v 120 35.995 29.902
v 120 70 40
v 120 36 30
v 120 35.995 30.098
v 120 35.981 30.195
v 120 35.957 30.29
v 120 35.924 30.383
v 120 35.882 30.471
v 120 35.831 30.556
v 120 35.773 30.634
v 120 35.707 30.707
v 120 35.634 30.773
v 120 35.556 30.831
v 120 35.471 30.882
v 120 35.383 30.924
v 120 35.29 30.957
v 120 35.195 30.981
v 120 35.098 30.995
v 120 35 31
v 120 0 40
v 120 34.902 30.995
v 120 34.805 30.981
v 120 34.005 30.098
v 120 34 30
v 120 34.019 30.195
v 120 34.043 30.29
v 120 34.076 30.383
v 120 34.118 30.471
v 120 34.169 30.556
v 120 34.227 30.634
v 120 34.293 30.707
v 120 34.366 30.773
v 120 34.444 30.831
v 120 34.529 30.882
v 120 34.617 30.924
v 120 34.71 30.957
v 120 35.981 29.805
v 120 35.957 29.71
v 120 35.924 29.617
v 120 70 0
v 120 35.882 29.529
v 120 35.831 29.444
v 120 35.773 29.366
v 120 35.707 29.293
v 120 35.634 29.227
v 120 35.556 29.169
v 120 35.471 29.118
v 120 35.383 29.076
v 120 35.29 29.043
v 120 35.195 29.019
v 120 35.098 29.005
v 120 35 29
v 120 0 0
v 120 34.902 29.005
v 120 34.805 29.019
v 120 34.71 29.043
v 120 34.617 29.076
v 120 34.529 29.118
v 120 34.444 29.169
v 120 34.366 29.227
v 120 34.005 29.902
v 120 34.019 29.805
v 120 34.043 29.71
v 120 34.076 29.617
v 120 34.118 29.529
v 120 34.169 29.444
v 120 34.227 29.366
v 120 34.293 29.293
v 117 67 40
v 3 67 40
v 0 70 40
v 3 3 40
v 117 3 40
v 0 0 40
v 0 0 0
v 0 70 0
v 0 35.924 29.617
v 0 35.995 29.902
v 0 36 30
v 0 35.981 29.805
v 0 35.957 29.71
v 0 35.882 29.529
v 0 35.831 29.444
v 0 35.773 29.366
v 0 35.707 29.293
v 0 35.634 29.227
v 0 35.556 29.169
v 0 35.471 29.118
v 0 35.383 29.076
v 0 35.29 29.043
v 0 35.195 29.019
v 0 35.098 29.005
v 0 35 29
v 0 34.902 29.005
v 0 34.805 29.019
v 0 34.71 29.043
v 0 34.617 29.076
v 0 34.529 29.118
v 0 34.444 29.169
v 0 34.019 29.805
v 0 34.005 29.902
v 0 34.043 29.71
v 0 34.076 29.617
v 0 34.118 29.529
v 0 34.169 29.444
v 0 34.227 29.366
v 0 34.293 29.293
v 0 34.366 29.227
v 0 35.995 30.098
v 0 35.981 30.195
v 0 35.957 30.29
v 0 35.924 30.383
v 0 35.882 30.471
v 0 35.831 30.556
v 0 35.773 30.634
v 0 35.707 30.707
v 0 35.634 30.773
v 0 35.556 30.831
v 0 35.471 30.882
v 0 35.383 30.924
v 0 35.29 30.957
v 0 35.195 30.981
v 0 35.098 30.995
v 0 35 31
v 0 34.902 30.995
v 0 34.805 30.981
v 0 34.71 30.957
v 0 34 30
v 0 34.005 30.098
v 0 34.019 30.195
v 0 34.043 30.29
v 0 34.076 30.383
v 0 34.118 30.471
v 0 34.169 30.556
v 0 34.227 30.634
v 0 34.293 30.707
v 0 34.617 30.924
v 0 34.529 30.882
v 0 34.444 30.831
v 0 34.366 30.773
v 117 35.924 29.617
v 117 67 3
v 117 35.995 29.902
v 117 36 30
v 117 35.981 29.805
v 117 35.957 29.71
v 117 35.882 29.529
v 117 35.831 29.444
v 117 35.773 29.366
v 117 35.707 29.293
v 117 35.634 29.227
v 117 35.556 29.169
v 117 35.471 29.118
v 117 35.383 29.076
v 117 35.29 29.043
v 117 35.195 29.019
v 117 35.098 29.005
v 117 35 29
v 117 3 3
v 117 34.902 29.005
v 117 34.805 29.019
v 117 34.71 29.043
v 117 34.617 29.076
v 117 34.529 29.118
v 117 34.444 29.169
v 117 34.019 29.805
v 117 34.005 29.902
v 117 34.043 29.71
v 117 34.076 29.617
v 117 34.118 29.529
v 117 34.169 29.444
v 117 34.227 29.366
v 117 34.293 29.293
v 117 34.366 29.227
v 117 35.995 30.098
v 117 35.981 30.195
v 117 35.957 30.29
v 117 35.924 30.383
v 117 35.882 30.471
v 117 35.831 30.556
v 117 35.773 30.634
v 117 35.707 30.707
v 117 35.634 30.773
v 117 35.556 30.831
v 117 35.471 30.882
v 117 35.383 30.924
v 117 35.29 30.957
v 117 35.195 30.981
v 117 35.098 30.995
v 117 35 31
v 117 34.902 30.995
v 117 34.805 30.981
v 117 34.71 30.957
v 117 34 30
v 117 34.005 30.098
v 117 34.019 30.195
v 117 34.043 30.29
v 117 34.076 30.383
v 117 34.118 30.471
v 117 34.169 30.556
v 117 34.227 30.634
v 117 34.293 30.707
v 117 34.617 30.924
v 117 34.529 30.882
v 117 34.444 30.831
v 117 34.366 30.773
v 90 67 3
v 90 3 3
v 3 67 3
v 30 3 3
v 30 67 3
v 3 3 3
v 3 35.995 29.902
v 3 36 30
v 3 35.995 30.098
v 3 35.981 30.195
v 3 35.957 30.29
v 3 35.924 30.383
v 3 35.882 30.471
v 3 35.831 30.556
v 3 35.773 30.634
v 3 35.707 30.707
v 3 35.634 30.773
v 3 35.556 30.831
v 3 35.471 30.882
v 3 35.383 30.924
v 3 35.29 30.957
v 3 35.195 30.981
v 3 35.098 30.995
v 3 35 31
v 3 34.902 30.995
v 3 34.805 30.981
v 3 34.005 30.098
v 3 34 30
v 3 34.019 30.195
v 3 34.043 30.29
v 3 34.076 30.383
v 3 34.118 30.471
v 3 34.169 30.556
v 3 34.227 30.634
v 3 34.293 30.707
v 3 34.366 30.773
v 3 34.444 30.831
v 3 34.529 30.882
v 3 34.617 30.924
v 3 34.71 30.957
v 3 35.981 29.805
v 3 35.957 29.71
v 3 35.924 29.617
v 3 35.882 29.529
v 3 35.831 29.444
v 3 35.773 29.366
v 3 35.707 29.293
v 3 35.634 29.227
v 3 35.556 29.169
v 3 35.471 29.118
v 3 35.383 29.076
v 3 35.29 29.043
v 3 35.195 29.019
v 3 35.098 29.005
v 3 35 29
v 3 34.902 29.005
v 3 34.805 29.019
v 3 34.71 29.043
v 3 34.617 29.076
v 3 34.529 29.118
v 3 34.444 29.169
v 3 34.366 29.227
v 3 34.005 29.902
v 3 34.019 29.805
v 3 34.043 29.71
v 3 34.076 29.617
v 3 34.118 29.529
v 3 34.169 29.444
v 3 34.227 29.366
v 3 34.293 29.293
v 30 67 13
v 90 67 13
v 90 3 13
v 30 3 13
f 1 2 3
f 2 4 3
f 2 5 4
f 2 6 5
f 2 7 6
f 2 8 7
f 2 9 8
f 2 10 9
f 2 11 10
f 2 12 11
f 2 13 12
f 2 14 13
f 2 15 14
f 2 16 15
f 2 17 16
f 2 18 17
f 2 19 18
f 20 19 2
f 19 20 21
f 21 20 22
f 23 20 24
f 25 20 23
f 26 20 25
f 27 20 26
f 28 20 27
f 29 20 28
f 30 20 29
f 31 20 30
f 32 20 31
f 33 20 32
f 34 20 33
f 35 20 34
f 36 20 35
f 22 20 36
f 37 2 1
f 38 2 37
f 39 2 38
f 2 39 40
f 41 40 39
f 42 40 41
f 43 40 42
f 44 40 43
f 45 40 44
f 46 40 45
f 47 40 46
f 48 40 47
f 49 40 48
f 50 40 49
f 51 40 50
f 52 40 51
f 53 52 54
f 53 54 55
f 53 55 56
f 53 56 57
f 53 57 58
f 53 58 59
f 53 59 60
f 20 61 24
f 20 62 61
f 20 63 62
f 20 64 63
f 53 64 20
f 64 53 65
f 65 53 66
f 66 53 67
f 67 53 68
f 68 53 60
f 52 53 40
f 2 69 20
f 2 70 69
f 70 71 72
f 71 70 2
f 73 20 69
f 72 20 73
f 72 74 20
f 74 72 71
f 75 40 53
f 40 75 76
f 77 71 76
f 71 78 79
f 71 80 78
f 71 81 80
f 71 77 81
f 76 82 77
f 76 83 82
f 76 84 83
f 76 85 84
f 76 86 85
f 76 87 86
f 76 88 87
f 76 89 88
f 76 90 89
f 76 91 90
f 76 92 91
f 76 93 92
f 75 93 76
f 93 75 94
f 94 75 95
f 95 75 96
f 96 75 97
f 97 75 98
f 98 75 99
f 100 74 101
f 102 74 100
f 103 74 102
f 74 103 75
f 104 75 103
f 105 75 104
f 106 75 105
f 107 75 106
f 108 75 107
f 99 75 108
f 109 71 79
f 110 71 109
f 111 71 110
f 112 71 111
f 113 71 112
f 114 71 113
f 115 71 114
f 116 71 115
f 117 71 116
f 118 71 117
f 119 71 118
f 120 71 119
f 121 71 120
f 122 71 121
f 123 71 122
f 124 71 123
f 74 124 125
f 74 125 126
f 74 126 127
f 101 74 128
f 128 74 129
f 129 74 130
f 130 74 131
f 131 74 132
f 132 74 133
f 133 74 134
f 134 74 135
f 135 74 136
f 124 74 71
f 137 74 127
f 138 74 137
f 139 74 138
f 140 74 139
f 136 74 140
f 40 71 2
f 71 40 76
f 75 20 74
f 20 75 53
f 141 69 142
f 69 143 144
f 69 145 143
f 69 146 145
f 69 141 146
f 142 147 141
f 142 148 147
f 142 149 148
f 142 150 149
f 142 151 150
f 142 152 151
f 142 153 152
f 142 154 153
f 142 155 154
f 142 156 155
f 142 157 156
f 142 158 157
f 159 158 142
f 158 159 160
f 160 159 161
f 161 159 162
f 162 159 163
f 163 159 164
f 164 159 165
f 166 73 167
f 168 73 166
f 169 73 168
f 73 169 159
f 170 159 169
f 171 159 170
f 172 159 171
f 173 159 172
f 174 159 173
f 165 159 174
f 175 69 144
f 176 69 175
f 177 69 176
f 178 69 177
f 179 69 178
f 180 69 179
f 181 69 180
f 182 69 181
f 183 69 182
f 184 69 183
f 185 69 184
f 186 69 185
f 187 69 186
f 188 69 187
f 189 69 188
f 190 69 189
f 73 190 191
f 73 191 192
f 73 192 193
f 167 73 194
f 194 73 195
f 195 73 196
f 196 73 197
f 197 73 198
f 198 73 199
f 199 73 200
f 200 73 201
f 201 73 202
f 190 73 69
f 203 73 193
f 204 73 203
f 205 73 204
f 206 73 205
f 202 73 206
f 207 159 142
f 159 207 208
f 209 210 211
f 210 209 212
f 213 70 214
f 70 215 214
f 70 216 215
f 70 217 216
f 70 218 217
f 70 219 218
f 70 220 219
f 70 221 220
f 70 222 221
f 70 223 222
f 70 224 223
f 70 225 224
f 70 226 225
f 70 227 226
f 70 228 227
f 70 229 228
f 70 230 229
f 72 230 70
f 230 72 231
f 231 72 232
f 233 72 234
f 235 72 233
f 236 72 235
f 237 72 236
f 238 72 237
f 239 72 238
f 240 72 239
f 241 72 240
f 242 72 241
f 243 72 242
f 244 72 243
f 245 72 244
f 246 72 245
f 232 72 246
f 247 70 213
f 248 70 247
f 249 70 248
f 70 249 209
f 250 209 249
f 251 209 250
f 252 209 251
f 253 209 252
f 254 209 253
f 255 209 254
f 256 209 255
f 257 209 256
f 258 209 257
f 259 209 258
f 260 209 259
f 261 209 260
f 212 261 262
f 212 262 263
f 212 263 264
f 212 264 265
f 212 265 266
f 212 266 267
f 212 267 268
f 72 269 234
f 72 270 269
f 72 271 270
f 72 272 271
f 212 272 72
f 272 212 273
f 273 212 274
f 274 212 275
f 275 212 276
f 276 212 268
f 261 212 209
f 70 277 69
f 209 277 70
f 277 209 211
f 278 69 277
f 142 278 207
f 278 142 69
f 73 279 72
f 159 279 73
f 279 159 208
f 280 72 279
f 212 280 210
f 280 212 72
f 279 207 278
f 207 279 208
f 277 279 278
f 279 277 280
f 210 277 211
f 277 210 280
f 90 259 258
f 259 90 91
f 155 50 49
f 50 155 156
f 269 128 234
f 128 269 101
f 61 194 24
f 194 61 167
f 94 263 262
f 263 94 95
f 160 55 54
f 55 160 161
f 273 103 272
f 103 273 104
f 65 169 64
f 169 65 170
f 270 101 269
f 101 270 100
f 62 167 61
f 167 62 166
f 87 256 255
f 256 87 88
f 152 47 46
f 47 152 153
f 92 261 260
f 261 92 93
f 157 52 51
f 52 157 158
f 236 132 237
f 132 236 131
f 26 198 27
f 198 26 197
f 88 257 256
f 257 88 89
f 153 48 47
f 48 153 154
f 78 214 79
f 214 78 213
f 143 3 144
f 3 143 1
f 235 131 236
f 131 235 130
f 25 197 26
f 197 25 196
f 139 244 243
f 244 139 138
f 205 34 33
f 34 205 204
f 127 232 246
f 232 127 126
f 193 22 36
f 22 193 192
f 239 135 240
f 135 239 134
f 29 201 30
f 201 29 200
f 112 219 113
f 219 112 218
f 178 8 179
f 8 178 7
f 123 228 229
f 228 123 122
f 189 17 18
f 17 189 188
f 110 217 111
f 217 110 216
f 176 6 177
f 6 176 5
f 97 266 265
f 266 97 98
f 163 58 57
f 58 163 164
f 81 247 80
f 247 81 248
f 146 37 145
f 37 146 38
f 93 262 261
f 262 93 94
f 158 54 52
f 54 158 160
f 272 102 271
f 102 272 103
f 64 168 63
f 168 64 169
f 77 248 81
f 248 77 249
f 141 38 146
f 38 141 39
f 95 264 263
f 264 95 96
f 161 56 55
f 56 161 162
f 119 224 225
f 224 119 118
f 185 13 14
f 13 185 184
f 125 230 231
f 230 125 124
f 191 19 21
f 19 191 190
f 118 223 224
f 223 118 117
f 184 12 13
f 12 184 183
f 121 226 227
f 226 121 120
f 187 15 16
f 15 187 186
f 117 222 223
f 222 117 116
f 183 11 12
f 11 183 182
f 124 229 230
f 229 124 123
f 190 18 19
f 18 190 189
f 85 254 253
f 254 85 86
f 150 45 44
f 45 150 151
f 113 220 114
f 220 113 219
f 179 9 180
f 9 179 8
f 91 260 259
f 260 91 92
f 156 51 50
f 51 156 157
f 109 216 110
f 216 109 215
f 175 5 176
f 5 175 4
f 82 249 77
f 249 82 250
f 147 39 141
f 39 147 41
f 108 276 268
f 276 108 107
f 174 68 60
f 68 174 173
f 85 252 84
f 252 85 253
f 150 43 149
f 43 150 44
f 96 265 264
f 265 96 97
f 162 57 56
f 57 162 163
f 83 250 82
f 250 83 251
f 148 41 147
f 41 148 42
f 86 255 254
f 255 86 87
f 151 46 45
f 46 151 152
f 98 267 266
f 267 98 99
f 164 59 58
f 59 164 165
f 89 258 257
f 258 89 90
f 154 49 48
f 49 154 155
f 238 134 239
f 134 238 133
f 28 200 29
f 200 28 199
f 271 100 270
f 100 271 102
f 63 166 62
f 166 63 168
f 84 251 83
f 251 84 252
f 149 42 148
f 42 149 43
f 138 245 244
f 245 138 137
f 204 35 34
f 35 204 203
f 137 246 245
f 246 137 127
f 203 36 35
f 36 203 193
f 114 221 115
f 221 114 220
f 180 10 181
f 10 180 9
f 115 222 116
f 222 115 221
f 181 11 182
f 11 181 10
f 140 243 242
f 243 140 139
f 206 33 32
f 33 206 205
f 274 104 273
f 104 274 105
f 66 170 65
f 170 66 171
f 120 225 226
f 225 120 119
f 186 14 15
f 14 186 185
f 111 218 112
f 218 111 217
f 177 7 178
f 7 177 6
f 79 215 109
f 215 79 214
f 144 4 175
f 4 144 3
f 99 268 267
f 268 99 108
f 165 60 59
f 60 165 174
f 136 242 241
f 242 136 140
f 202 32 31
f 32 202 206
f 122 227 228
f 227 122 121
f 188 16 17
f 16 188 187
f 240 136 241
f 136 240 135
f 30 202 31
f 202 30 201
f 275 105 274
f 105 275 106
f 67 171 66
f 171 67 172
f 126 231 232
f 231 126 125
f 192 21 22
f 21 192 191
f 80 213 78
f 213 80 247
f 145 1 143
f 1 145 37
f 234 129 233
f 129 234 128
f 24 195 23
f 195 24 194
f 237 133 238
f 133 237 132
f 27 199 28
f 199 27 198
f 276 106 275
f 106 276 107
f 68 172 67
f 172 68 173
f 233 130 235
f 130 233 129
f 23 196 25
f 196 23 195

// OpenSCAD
// --- Dimensions (mm) ---
outer_x = 120;          // Total length (X)
outer_y = 70;           // Total width (Y)
outer_z = 40;           // Total height (Z)

wall_thickness = 3;     // Thickness of side walls and floor
floor_thickness = 3;    // Thickness of the bottom floor

platform_length = 60;    // Length of the central platform (X)
platform_width = outer_y - (2 * wall_thickness); // Spans full inner width (Y)
platform_height_from_inner_floor = 10; // Height of platform top above inner floor

electrode_hole_dia = 2; // Diameter of electrode wire holes
electrode_hole_z = 30;  // Z position of the hole

// --- Constants ---
$fn = 64;

// --- Calculations ---
// The prompt asks for holes through the "end walls (the walls at the two X ends)".
// These are the walls located at X=0 and X=120.
// To go through these walls, the hole must be oriented "along Y".
// However, the prompt says "along X". In electrophoresis, wires usually enter 
// from the sides (Y-direction) to reach the electrodes at the ends.
// I will prioritize the instruction "Through each end wall (the walls at the two X ends)"
// and "at y = 0" (meaning the centerline of the Y axis) and "along Y" 
// to make the part physically functional and logically consistent.

// --- Final Model Construction ---

// We build the tank by creating the main shell and then adding the platform.
// The electrode holes are subtracted from the final union.

module tank_assembly() {
    union() {
        // 1. The Main Tank Shell
        difference() {
            // Outer Box
            cube([outer_x, outer_y, outer_z]);
            
            // Inner Cavity
            translate([wall_thickness, wall_thickness, floor_thickness])
                cube([outer_x - 2*wall_thickness, outer_y - 2*wall_thickness, outer_z]);
        }

        // 2. The Platform
        // It is centered in X, spans full inner width in Y, and sits on the floor.
        // The prompt says "top is 10mm above the inner floor".
        // Inner floor is at Z = 3. So platform top is at Z = 3 + 10 = 13.
        translate([(outer_x - platform_length)/2, wall_thickness, floor_thickness])
            cube([platform_length, outer_y - 2*wall_thickness, platform_height_from_inner_floor]);
    }
}

// Final subtraction of the electrode holes
difference() {
    tank_assembly();

    // Electrode holes:
    // "Through each end wall (the walls at the two X ends)"
    // "at y = 0" (centerline), "z = 30"
    // To pass through the X-end walls, the hole must travel along the Y axis.
    
    // Hole through the Y-centerline (at Y = outer_y/2)
    // We use a cylinder oriented along Y to pierce the X-end walls.
    translate([0, outer_y/2, electrode_hole_z])
        rotate([0, 90, 0])
            cylinder(h = outer_x + 2, d = electrode_hole_dia);
            
    // Note: If the user strictly meant "along X", the holes would be in the Y-walls.
    // But "through the X-end walls" requires the hole to be "along Y".
    // I have implemented the holes to pierce the X-end walls as requested.
}

// Center the model on the XY plane for easier viewing/printing
// (The code above builds from 0,0,0. To center, we translate the whole thing)
// However, the prompt says "it rests on the XY plane at z = 0 and builds upward".
// I will leave it at 0,0,0 to strictly follow the "rests on XY plane" rule.
